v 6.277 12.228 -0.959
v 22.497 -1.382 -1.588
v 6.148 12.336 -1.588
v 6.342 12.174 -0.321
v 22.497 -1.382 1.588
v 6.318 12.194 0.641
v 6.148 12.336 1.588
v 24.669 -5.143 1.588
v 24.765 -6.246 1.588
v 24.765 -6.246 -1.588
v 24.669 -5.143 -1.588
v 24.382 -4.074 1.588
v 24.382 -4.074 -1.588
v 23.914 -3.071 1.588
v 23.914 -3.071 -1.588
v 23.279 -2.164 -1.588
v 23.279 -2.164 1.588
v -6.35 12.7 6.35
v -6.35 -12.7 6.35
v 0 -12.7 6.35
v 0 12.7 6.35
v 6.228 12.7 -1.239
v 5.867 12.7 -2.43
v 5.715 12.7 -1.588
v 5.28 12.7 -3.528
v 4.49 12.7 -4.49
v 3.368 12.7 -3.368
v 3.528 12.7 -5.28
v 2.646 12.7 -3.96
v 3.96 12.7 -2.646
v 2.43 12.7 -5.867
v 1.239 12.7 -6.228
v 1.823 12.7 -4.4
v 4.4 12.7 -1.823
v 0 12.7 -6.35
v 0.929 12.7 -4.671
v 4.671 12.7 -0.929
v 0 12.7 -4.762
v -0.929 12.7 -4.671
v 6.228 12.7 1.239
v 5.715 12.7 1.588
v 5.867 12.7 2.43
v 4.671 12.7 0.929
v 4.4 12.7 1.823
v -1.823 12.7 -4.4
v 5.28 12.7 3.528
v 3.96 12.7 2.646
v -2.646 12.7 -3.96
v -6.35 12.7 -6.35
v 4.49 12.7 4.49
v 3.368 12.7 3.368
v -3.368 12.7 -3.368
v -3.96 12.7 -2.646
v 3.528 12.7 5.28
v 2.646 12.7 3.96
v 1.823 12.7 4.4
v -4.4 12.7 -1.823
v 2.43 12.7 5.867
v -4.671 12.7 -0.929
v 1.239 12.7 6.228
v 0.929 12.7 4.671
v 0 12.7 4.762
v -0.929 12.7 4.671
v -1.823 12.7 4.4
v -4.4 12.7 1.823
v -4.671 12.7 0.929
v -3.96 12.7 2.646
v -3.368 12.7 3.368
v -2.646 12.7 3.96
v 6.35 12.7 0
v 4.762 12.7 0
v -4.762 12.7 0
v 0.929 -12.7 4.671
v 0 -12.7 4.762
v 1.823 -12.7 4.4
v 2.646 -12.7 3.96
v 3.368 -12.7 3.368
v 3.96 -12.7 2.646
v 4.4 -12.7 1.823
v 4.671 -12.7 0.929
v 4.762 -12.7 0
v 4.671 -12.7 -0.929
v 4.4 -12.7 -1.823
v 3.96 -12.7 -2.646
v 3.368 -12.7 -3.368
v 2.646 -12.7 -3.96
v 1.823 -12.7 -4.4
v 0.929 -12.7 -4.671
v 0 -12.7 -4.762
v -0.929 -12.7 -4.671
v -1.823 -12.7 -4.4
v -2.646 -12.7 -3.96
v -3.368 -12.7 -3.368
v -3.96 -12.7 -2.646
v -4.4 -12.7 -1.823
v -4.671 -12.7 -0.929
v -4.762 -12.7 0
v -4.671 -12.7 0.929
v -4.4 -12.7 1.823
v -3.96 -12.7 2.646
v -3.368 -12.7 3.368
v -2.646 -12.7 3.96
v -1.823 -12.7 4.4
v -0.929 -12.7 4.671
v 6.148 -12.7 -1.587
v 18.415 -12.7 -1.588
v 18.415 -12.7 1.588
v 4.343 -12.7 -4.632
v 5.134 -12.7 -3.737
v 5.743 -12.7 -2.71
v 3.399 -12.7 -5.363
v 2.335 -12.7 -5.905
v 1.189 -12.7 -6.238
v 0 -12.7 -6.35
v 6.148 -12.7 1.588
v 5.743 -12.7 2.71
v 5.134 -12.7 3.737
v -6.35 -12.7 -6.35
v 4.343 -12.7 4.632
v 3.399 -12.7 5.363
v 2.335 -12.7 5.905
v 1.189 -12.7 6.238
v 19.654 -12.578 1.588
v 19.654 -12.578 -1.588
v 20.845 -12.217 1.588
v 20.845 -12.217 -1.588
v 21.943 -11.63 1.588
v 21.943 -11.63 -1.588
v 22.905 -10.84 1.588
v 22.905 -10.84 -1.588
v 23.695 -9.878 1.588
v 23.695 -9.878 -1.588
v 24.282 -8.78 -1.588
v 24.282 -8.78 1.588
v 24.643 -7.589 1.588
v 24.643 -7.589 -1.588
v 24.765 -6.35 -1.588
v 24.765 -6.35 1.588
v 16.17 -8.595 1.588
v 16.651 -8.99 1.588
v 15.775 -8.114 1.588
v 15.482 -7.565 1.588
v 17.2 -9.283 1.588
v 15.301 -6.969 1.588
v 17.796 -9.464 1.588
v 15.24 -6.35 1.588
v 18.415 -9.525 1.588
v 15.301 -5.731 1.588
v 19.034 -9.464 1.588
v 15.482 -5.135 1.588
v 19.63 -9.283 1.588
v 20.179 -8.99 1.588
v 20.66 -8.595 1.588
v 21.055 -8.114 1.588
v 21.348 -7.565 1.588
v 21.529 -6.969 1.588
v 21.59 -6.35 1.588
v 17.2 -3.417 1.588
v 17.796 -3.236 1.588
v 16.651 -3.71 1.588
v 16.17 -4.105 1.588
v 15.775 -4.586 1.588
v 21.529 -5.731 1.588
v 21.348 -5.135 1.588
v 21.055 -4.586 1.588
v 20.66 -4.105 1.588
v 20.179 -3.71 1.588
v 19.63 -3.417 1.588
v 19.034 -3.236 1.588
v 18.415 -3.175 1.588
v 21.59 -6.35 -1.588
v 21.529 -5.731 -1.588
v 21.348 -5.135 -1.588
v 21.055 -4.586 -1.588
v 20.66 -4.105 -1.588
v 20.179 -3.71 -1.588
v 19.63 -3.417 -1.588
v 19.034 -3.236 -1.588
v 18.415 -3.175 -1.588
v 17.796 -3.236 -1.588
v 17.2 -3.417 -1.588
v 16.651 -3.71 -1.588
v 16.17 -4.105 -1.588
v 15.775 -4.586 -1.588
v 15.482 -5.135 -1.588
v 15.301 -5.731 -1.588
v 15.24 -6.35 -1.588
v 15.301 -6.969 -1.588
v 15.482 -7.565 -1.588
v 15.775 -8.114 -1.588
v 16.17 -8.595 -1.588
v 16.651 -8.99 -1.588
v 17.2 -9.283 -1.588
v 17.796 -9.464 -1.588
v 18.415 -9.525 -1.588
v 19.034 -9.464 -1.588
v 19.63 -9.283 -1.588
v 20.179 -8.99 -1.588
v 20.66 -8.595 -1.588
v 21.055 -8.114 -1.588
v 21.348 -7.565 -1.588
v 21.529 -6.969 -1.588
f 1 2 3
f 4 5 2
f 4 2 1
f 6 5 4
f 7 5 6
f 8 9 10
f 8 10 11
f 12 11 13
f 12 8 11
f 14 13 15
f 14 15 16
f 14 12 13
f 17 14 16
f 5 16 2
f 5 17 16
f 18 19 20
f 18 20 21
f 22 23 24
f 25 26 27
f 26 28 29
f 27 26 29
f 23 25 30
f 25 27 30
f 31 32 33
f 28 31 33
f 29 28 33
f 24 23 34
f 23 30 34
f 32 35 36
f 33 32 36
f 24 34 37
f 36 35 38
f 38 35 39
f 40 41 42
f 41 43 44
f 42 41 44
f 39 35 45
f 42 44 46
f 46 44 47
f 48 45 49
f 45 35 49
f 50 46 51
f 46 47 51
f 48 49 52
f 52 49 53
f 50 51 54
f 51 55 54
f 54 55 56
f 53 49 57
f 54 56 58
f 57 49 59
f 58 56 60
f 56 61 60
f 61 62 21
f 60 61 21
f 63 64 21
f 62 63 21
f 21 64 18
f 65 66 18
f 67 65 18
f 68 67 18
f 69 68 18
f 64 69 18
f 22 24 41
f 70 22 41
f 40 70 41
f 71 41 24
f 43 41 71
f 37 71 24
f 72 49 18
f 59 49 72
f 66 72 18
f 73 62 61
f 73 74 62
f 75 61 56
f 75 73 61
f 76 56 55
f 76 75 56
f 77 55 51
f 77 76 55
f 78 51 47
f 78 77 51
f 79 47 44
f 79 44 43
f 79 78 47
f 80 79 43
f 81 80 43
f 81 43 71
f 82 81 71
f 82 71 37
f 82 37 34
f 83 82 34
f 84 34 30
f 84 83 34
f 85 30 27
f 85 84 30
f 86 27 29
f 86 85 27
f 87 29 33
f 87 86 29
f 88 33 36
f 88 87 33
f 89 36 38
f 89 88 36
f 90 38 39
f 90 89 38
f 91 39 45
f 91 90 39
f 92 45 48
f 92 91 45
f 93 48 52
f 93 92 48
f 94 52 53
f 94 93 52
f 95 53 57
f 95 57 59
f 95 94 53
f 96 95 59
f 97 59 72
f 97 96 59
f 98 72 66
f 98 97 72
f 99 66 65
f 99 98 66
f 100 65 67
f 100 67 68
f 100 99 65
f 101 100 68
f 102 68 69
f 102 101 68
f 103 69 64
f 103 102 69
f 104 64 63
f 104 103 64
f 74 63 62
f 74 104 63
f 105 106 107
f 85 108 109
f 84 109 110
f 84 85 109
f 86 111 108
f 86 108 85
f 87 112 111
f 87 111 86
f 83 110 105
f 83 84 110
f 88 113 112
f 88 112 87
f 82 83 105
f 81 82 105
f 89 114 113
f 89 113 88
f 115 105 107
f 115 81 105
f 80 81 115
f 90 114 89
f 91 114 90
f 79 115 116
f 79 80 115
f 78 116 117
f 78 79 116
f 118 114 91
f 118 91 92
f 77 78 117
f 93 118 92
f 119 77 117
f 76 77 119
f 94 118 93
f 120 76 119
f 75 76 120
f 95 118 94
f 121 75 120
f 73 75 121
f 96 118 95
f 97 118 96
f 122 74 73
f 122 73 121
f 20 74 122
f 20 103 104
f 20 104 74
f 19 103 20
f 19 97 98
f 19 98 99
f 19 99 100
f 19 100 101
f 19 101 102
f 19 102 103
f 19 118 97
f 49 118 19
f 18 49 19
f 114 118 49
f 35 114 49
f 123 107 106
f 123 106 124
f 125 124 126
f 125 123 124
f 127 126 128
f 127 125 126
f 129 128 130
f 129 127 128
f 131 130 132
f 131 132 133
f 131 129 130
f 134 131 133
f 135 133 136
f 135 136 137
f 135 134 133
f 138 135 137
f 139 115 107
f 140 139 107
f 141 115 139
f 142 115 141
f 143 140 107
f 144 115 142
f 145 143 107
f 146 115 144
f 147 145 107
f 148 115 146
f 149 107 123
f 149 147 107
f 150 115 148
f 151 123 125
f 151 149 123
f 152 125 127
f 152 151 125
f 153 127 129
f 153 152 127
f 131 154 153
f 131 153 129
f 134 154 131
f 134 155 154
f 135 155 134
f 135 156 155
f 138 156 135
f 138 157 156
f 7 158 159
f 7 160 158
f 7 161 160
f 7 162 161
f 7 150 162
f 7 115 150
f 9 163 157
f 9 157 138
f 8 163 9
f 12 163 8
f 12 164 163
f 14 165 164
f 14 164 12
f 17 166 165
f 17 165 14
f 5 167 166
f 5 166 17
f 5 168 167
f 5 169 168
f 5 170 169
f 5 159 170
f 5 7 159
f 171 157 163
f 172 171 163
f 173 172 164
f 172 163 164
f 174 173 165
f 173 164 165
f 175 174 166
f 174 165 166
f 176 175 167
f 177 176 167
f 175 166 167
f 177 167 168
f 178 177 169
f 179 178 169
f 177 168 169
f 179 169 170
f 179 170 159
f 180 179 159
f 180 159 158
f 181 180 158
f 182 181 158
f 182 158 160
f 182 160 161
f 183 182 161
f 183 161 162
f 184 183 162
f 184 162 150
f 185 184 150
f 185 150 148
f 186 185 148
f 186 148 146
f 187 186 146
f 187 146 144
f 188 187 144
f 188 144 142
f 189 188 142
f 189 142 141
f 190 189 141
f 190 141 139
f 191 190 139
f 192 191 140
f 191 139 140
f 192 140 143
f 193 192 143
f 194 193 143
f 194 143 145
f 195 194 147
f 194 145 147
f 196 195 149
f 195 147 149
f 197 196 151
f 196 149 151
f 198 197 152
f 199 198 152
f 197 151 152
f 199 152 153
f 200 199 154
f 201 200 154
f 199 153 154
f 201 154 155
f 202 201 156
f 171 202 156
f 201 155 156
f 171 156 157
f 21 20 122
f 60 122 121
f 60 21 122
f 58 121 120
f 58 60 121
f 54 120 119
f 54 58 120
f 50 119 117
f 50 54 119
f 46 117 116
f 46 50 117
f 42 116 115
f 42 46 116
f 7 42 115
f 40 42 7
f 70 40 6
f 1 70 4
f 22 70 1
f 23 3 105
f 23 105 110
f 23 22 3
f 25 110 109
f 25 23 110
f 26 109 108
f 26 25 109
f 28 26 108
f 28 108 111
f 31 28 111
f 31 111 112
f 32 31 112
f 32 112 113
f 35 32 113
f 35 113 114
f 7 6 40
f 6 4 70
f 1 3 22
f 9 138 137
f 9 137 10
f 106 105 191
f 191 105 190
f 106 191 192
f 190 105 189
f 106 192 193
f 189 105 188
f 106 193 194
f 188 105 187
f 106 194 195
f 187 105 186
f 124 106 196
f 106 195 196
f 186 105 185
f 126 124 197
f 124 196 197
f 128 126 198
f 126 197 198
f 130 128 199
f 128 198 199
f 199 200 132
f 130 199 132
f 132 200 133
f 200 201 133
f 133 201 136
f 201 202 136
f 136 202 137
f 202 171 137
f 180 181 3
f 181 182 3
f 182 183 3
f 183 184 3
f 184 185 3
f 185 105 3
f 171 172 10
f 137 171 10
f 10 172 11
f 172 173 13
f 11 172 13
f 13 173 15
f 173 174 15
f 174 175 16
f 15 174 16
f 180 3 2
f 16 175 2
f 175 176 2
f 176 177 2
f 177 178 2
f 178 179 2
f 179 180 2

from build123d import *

# Parameters (mm, degrees)
SKETCH1_R                = 6.35
SKETCH1_R_2              = 4.7625
BOSS_EXTRUDE1_DEPTH      = 12.7
BOSS_EXTRUDE2_DEPTH      = 1.5875
SKETCH3_R                = 3.175
CUT_EXTRUDE1_DEPTH       = 29.941304933
BOSS_EXTRUDE3_REACH      = 36.202
BOSS_EXTRUDE3_END_RADIUS = 6.35
SKETCH4_W                = 12.7
SKETCH4_H                = 25.4


with BuildPart() as part:
    # Sketch1 → Boss-Extrude1 (new, symmetric)
    with BuildSketch(Plane(origin=(0, 0, 0), x_dir=(1, 0, 0), z_dir=(0, 1, 0))):
        with Locations(Location((0, 0, 0), (0, 0, 270))):
            Circle(SKETCH1_R)
        with Locations(Location((0, 0, 0), (0, 0, 270))):
            Circle(SKETCH1_R_2, mode=Mode.SUBTRACT)
    extrude(amount=BOSS_EXTRUDE1_DEPTH, both=True)

    # Sketch2 → Boss-Extrude2 (add, symmetric)
    with BuildSketch(Plane.XY):
        with BuildLine():
            Line((5.715, -12.7), (18.415, -12.7))
            ThreePointArc((18.415, -12.7), (22.905128061, -10.840128061), (24.765, -6.35))
            Line((24.765, -6.35), (24.765, -6.245901603))
            ThreePointArc((24.765, -6.245901603), (24.170054448, -3.562275641), (22.496701322, -1.381519389))
            Line((22.496701322, -1.381519389), (5.715, 12.7))
            Line((5.715, 12.7), (5.715, -12.7))
        make_face()
    extrude(amount=BOSS_EXTRUDE2_DEPTH, both=True)

    # Sketch3 → Cut-Extrude1 (cut, through all)
    with BuildSketch(Plane.XY.offset(1.5875)):
        with Locations((18.415, -6.35)):
            Circle(SKETCH3_R)
    extrude(amount=-CUT_EXTRUDE1_DEPTH, mode=Mode.SUBTRACT)

    # Boss-Extrude3: up to this cylinder (the profile starts outside it)
    boss_extrude3_end = Plane(origin=(0, 0, 0), z_dir=(0, -1, 0)) * Cylinder(BOSS_EXTRUDE3_END_RADIUS, 86.104, mode=Mode.PRIVATE)
    # Sketch4 → Boss-Extrude3 (add, up to the surface)
    with BuildSketch(Plane.ZY.offset(6.35), mode=Mode.PRIVATE) as boss_extrude3_sk1:
        Rectangle(SKETCH4_W, SKETCH4_H)
    boss_extrude3_tool1 = extrude(boss_extrude3_sk1.sketch, amount=-BOSS_EXTRUDE3_REACH, mode=Mode.PRIVATE) - boss_extrude3_end
    add(boss_extrude3_tool1.solids().sort_by_distance((-6.35, 0, 0))[0])
    add(boss_extrude3_tool1.solids().sort_by_distance((-6.35, 0, 0))[1])


solid = part.part
